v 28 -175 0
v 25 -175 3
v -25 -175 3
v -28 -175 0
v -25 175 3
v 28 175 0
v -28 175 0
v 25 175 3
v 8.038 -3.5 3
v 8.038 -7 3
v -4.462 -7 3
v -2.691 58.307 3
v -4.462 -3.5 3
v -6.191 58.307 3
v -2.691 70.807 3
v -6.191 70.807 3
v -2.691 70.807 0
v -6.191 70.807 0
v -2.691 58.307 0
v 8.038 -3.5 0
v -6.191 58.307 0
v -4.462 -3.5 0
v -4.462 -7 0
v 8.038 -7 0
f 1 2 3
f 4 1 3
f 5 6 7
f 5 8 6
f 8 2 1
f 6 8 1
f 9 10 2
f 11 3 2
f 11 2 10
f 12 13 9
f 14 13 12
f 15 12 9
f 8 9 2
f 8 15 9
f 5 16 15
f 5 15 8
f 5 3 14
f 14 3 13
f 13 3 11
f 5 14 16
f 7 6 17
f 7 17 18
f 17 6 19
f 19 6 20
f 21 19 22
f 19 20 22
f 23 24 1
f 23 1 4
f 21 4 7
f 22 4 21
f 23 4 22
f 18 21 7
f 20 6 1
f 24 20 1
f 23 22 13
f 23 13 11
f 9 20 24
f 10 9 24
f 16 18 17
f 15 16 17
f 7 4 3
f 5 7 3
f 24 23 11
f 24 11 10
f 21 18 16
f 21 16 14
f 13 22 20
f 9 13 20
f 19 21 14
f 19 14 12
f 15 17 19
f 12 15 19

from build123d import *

# Parameters (mm, degrees)
SKETCH1_W           = 350
SKETCH1_H           = 50
BOSS_EXTRUDE1_DEPTH = 3
BOSS_EXTRUDE2_DEPTH = 350
SKETCH3_OUTSIDE_W   = 128.892
SKETCH3_OUTSIDE_H   = 422.892
SKETCH3_OUTSIDE_W_2 = 56
SKETCH3_OUTSIDE_H_2 = 350
SKETCH3_OUTSIDE_W_3 = 12.5
SKETCH3_OUTSIDE_H_3 = 3.5
SKETCH3_OUTSIDE_W_4 = 3.5
SKETCH3_OUTSIDE_H_4 = 12.5
CUT_EXTRUDE2_DEPTH  = 178.251234128


with BuildPart() as part:
    # Sketch1 → Boss-Extrude1 (new body)
    with BuildSketch(Plane(origin=(0, 0, 0), x_dir=(0, 1, 0), z_dir=(0, 0, 1))):
        Rectangle(SKETCH1_W, SKETCH1_H)
    extrude(amount=BOSS_EXTRUDE1_DEPTH)

    # Sketch2 → Boss-Extrude2 (add, through all)
    with BuildSketch(Plane.XZ.offset(175)):
        Polygon((-25, 3), (-25, 0), (-28, 0), align=None)
        Polygon((25, 3), (28, 0), (25, 0), align=None)
    extrude(amount=-BOSS_EXTRUDE2_DEPTH)

    # Sketch3 outside → Cut-Extrude2 (cut, through all)
    # profile 1 of 3: a face of its own
    with BuildSketch(Plane(origin=(0, 0, 0), x_dir=(1, 0, 0), z_dir=(0, 0, -1))):
        Rectangle(SKETCH3_OUTSIDE_W, SKETCH3_OUTSIDE_H)
        Rectangle(SKETCH3_OUTSIDE_W_2, SKETCH3_OUTSIDE_H_2, mode=Mode.SUBTRACT)
    # profile 2 of 3: a face of its own
    with BuildSketch(Plane(origin=(0, 0, 0), x_dir=(1, 0, 0), z_dir=(0, 0, -1))):
        with Locations((1.788055669, 5.25)):
            Rectangle(SKETCH3_OUTSIDE_W_3, SKETCH3_OUTSIDE_H_3)
    # profile 3 of 3: a face of its own
    with BuildSketch(Plane(origin=(0, 0, 0), x_dir=(1, 0, 0), z_dir=(0, 0, -1))):
        with Locations((-4.440759591, -64.557376571)):
            Rectangle(SKETCH3_OUTSIDE_W_4, SKETCH3_OUTSIDE_H_4)
    extrude(amount=-CUT_EXTRUDE2_DEPTH, mode=Mode.SUBTRACT)


solid = part.part
